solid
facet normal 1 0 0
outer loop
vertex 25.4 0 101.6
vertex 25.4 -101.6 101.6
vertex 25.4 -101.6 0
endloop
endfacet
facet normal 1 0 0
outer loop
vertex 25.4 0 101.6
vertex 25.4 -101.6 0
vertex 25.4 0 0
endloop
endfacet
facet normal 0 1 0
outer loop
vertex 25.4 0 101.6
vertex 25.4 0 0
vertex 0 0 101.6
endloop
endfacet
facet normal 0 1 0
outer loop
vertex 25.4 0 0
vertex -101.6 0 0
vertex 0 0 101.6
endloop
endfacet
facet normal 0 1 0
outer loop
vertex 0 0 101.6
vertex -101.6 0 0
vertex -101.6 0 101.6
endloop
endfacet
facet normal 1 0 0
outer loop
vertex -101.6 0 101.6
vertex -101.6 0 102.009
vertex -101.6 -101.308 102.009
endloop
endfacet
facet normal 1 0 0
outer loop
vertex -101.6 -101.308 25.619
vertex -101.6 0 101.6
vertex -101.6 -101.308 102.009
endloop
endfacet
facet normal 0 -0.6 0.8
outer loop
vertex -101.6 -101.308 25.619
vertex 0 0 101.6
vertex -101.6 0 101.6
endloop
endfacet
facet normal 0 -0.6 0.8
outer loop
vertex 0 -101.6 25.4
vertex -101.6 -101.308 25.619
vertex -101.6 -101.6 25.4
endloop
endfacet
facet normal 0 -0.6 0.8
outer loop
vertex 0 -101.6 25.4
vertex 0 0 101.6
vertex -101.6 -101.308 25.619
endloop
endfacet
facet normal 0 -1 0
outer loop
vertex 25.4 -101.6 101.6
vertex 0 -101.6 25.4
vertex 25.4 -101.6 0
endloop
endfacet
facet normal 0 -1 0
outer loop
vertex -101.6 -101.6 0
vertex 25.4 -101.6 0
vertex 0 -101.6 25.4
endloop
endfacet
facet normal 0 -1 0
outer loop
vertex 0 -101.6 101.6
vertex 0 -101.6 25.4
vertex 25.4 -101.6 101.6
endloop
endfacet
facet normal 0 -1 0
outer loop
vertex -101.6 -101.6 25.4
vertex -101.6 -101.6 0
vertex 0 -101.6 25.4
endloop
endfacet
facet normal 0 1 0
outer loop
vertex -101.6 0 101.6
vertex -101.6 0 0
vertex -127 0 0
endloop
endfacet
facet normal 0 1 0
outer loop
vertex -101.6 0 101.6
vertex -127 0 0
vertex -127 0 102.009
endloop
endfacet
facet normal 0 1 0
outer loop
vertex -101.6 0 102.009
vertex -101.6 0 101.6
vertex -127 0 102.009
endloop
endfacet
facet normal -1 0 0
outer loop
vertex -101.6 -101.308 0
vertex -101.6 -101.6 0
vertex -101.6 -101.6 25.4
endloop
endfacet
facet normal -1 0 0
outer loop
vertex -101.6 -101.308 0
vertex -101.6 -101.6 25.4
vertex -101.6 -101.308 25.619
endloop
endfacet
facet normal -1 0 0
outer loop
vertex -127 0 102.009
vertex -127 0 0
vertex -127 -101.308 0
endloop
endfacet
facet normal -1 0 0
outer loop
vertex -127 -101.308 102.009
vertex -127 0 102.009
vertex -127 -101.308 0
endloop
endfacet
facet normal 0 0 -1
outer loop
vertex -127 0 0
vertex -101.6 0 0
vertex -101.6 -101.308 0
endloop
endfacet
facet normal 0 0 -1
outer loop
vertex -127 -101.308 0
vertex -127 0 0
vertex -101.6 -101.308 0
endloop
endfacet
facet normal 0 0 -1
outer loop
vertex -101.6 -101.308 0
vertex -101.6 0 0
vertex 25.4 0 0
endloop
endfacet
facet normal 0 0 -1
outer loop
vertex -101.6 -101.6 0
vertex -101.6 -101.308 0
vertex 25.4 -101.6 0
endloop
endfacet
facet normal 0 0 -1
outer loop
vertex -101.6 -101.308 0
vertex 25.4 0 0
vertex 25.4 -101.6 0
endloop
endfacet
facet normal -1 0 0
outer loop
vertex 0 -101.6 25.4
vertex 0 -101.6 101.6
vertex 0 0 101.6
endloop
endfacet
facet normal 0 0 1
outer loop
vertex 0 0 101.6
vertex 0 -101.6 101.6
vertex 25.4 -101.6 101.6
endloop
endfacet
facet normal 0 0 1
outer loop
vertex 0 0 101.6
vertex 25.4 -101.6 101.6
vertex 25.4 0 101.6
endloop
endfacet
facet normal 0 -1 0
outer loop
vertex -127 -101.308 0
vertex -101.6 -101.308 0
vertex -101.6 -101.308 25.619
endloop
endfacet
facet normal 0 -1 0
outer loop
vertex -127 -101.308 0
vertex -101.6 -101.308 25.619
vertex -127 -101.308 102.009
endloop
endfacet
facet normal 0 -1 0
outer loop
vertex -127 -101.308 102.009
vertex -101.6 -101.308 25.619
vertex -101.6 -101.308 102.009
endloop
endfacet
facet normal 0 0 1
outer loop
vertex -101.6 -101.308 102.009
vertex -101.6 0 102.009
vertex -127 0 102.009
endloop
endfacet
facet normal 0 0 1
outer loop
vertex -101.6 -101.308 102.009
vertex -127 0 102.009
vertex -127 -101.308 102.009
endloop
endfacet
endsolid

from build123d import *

# Parameters (mm, degrees)
F0_W     = 101.6
F0_H     = 101.6
F1_DEPTH = 25.4
F3_DEPTH = 101.6
F4_W     = 101.6
F4_H     = 101.6
F5_DEPTH = 25.4
F6_W     = 101.307563
F6_H     = 102.009408
F7_DEPTH = 25.4


with BuildPart() as f1:
    # F0 (on Top) → F1 (new body)
    with BuildSketch(Plane.XY):
        with Locations((-50.8, -50.8)):
            Rectangle(F0_W, F0_H)
    extrude(amount=F1_DEPTH)

    # F2 (on face) → F3 (join)
    with BuildSketch(Plane.YZ):
        Polygon((-101.6, 25.4), (0, 25.4), (0, 101.6), align=None)
    extrude(amount=-F3_DEPTH)

    # F4 (on face) → F5 (join)
    with BuildSketch(Plane.YZ):
        with Locations((-50.8, 50.8)):
            Rectangle(F4_W, F4_H)
    extrude(amount=F5_DEPTH)

    # F6 (on face) → F7 (join)
    with BuildSketch(Plane(origin=(-101.6, 0, 0), x_dir=(0, -1, 0), z_dir=(-1, 0, 0))):
        with Locations((50.653782, 51.004704)):
            Rectangle(F6_W, F6_H)
    extrude(amount=F7_DEPTH)


solid = f1.part
